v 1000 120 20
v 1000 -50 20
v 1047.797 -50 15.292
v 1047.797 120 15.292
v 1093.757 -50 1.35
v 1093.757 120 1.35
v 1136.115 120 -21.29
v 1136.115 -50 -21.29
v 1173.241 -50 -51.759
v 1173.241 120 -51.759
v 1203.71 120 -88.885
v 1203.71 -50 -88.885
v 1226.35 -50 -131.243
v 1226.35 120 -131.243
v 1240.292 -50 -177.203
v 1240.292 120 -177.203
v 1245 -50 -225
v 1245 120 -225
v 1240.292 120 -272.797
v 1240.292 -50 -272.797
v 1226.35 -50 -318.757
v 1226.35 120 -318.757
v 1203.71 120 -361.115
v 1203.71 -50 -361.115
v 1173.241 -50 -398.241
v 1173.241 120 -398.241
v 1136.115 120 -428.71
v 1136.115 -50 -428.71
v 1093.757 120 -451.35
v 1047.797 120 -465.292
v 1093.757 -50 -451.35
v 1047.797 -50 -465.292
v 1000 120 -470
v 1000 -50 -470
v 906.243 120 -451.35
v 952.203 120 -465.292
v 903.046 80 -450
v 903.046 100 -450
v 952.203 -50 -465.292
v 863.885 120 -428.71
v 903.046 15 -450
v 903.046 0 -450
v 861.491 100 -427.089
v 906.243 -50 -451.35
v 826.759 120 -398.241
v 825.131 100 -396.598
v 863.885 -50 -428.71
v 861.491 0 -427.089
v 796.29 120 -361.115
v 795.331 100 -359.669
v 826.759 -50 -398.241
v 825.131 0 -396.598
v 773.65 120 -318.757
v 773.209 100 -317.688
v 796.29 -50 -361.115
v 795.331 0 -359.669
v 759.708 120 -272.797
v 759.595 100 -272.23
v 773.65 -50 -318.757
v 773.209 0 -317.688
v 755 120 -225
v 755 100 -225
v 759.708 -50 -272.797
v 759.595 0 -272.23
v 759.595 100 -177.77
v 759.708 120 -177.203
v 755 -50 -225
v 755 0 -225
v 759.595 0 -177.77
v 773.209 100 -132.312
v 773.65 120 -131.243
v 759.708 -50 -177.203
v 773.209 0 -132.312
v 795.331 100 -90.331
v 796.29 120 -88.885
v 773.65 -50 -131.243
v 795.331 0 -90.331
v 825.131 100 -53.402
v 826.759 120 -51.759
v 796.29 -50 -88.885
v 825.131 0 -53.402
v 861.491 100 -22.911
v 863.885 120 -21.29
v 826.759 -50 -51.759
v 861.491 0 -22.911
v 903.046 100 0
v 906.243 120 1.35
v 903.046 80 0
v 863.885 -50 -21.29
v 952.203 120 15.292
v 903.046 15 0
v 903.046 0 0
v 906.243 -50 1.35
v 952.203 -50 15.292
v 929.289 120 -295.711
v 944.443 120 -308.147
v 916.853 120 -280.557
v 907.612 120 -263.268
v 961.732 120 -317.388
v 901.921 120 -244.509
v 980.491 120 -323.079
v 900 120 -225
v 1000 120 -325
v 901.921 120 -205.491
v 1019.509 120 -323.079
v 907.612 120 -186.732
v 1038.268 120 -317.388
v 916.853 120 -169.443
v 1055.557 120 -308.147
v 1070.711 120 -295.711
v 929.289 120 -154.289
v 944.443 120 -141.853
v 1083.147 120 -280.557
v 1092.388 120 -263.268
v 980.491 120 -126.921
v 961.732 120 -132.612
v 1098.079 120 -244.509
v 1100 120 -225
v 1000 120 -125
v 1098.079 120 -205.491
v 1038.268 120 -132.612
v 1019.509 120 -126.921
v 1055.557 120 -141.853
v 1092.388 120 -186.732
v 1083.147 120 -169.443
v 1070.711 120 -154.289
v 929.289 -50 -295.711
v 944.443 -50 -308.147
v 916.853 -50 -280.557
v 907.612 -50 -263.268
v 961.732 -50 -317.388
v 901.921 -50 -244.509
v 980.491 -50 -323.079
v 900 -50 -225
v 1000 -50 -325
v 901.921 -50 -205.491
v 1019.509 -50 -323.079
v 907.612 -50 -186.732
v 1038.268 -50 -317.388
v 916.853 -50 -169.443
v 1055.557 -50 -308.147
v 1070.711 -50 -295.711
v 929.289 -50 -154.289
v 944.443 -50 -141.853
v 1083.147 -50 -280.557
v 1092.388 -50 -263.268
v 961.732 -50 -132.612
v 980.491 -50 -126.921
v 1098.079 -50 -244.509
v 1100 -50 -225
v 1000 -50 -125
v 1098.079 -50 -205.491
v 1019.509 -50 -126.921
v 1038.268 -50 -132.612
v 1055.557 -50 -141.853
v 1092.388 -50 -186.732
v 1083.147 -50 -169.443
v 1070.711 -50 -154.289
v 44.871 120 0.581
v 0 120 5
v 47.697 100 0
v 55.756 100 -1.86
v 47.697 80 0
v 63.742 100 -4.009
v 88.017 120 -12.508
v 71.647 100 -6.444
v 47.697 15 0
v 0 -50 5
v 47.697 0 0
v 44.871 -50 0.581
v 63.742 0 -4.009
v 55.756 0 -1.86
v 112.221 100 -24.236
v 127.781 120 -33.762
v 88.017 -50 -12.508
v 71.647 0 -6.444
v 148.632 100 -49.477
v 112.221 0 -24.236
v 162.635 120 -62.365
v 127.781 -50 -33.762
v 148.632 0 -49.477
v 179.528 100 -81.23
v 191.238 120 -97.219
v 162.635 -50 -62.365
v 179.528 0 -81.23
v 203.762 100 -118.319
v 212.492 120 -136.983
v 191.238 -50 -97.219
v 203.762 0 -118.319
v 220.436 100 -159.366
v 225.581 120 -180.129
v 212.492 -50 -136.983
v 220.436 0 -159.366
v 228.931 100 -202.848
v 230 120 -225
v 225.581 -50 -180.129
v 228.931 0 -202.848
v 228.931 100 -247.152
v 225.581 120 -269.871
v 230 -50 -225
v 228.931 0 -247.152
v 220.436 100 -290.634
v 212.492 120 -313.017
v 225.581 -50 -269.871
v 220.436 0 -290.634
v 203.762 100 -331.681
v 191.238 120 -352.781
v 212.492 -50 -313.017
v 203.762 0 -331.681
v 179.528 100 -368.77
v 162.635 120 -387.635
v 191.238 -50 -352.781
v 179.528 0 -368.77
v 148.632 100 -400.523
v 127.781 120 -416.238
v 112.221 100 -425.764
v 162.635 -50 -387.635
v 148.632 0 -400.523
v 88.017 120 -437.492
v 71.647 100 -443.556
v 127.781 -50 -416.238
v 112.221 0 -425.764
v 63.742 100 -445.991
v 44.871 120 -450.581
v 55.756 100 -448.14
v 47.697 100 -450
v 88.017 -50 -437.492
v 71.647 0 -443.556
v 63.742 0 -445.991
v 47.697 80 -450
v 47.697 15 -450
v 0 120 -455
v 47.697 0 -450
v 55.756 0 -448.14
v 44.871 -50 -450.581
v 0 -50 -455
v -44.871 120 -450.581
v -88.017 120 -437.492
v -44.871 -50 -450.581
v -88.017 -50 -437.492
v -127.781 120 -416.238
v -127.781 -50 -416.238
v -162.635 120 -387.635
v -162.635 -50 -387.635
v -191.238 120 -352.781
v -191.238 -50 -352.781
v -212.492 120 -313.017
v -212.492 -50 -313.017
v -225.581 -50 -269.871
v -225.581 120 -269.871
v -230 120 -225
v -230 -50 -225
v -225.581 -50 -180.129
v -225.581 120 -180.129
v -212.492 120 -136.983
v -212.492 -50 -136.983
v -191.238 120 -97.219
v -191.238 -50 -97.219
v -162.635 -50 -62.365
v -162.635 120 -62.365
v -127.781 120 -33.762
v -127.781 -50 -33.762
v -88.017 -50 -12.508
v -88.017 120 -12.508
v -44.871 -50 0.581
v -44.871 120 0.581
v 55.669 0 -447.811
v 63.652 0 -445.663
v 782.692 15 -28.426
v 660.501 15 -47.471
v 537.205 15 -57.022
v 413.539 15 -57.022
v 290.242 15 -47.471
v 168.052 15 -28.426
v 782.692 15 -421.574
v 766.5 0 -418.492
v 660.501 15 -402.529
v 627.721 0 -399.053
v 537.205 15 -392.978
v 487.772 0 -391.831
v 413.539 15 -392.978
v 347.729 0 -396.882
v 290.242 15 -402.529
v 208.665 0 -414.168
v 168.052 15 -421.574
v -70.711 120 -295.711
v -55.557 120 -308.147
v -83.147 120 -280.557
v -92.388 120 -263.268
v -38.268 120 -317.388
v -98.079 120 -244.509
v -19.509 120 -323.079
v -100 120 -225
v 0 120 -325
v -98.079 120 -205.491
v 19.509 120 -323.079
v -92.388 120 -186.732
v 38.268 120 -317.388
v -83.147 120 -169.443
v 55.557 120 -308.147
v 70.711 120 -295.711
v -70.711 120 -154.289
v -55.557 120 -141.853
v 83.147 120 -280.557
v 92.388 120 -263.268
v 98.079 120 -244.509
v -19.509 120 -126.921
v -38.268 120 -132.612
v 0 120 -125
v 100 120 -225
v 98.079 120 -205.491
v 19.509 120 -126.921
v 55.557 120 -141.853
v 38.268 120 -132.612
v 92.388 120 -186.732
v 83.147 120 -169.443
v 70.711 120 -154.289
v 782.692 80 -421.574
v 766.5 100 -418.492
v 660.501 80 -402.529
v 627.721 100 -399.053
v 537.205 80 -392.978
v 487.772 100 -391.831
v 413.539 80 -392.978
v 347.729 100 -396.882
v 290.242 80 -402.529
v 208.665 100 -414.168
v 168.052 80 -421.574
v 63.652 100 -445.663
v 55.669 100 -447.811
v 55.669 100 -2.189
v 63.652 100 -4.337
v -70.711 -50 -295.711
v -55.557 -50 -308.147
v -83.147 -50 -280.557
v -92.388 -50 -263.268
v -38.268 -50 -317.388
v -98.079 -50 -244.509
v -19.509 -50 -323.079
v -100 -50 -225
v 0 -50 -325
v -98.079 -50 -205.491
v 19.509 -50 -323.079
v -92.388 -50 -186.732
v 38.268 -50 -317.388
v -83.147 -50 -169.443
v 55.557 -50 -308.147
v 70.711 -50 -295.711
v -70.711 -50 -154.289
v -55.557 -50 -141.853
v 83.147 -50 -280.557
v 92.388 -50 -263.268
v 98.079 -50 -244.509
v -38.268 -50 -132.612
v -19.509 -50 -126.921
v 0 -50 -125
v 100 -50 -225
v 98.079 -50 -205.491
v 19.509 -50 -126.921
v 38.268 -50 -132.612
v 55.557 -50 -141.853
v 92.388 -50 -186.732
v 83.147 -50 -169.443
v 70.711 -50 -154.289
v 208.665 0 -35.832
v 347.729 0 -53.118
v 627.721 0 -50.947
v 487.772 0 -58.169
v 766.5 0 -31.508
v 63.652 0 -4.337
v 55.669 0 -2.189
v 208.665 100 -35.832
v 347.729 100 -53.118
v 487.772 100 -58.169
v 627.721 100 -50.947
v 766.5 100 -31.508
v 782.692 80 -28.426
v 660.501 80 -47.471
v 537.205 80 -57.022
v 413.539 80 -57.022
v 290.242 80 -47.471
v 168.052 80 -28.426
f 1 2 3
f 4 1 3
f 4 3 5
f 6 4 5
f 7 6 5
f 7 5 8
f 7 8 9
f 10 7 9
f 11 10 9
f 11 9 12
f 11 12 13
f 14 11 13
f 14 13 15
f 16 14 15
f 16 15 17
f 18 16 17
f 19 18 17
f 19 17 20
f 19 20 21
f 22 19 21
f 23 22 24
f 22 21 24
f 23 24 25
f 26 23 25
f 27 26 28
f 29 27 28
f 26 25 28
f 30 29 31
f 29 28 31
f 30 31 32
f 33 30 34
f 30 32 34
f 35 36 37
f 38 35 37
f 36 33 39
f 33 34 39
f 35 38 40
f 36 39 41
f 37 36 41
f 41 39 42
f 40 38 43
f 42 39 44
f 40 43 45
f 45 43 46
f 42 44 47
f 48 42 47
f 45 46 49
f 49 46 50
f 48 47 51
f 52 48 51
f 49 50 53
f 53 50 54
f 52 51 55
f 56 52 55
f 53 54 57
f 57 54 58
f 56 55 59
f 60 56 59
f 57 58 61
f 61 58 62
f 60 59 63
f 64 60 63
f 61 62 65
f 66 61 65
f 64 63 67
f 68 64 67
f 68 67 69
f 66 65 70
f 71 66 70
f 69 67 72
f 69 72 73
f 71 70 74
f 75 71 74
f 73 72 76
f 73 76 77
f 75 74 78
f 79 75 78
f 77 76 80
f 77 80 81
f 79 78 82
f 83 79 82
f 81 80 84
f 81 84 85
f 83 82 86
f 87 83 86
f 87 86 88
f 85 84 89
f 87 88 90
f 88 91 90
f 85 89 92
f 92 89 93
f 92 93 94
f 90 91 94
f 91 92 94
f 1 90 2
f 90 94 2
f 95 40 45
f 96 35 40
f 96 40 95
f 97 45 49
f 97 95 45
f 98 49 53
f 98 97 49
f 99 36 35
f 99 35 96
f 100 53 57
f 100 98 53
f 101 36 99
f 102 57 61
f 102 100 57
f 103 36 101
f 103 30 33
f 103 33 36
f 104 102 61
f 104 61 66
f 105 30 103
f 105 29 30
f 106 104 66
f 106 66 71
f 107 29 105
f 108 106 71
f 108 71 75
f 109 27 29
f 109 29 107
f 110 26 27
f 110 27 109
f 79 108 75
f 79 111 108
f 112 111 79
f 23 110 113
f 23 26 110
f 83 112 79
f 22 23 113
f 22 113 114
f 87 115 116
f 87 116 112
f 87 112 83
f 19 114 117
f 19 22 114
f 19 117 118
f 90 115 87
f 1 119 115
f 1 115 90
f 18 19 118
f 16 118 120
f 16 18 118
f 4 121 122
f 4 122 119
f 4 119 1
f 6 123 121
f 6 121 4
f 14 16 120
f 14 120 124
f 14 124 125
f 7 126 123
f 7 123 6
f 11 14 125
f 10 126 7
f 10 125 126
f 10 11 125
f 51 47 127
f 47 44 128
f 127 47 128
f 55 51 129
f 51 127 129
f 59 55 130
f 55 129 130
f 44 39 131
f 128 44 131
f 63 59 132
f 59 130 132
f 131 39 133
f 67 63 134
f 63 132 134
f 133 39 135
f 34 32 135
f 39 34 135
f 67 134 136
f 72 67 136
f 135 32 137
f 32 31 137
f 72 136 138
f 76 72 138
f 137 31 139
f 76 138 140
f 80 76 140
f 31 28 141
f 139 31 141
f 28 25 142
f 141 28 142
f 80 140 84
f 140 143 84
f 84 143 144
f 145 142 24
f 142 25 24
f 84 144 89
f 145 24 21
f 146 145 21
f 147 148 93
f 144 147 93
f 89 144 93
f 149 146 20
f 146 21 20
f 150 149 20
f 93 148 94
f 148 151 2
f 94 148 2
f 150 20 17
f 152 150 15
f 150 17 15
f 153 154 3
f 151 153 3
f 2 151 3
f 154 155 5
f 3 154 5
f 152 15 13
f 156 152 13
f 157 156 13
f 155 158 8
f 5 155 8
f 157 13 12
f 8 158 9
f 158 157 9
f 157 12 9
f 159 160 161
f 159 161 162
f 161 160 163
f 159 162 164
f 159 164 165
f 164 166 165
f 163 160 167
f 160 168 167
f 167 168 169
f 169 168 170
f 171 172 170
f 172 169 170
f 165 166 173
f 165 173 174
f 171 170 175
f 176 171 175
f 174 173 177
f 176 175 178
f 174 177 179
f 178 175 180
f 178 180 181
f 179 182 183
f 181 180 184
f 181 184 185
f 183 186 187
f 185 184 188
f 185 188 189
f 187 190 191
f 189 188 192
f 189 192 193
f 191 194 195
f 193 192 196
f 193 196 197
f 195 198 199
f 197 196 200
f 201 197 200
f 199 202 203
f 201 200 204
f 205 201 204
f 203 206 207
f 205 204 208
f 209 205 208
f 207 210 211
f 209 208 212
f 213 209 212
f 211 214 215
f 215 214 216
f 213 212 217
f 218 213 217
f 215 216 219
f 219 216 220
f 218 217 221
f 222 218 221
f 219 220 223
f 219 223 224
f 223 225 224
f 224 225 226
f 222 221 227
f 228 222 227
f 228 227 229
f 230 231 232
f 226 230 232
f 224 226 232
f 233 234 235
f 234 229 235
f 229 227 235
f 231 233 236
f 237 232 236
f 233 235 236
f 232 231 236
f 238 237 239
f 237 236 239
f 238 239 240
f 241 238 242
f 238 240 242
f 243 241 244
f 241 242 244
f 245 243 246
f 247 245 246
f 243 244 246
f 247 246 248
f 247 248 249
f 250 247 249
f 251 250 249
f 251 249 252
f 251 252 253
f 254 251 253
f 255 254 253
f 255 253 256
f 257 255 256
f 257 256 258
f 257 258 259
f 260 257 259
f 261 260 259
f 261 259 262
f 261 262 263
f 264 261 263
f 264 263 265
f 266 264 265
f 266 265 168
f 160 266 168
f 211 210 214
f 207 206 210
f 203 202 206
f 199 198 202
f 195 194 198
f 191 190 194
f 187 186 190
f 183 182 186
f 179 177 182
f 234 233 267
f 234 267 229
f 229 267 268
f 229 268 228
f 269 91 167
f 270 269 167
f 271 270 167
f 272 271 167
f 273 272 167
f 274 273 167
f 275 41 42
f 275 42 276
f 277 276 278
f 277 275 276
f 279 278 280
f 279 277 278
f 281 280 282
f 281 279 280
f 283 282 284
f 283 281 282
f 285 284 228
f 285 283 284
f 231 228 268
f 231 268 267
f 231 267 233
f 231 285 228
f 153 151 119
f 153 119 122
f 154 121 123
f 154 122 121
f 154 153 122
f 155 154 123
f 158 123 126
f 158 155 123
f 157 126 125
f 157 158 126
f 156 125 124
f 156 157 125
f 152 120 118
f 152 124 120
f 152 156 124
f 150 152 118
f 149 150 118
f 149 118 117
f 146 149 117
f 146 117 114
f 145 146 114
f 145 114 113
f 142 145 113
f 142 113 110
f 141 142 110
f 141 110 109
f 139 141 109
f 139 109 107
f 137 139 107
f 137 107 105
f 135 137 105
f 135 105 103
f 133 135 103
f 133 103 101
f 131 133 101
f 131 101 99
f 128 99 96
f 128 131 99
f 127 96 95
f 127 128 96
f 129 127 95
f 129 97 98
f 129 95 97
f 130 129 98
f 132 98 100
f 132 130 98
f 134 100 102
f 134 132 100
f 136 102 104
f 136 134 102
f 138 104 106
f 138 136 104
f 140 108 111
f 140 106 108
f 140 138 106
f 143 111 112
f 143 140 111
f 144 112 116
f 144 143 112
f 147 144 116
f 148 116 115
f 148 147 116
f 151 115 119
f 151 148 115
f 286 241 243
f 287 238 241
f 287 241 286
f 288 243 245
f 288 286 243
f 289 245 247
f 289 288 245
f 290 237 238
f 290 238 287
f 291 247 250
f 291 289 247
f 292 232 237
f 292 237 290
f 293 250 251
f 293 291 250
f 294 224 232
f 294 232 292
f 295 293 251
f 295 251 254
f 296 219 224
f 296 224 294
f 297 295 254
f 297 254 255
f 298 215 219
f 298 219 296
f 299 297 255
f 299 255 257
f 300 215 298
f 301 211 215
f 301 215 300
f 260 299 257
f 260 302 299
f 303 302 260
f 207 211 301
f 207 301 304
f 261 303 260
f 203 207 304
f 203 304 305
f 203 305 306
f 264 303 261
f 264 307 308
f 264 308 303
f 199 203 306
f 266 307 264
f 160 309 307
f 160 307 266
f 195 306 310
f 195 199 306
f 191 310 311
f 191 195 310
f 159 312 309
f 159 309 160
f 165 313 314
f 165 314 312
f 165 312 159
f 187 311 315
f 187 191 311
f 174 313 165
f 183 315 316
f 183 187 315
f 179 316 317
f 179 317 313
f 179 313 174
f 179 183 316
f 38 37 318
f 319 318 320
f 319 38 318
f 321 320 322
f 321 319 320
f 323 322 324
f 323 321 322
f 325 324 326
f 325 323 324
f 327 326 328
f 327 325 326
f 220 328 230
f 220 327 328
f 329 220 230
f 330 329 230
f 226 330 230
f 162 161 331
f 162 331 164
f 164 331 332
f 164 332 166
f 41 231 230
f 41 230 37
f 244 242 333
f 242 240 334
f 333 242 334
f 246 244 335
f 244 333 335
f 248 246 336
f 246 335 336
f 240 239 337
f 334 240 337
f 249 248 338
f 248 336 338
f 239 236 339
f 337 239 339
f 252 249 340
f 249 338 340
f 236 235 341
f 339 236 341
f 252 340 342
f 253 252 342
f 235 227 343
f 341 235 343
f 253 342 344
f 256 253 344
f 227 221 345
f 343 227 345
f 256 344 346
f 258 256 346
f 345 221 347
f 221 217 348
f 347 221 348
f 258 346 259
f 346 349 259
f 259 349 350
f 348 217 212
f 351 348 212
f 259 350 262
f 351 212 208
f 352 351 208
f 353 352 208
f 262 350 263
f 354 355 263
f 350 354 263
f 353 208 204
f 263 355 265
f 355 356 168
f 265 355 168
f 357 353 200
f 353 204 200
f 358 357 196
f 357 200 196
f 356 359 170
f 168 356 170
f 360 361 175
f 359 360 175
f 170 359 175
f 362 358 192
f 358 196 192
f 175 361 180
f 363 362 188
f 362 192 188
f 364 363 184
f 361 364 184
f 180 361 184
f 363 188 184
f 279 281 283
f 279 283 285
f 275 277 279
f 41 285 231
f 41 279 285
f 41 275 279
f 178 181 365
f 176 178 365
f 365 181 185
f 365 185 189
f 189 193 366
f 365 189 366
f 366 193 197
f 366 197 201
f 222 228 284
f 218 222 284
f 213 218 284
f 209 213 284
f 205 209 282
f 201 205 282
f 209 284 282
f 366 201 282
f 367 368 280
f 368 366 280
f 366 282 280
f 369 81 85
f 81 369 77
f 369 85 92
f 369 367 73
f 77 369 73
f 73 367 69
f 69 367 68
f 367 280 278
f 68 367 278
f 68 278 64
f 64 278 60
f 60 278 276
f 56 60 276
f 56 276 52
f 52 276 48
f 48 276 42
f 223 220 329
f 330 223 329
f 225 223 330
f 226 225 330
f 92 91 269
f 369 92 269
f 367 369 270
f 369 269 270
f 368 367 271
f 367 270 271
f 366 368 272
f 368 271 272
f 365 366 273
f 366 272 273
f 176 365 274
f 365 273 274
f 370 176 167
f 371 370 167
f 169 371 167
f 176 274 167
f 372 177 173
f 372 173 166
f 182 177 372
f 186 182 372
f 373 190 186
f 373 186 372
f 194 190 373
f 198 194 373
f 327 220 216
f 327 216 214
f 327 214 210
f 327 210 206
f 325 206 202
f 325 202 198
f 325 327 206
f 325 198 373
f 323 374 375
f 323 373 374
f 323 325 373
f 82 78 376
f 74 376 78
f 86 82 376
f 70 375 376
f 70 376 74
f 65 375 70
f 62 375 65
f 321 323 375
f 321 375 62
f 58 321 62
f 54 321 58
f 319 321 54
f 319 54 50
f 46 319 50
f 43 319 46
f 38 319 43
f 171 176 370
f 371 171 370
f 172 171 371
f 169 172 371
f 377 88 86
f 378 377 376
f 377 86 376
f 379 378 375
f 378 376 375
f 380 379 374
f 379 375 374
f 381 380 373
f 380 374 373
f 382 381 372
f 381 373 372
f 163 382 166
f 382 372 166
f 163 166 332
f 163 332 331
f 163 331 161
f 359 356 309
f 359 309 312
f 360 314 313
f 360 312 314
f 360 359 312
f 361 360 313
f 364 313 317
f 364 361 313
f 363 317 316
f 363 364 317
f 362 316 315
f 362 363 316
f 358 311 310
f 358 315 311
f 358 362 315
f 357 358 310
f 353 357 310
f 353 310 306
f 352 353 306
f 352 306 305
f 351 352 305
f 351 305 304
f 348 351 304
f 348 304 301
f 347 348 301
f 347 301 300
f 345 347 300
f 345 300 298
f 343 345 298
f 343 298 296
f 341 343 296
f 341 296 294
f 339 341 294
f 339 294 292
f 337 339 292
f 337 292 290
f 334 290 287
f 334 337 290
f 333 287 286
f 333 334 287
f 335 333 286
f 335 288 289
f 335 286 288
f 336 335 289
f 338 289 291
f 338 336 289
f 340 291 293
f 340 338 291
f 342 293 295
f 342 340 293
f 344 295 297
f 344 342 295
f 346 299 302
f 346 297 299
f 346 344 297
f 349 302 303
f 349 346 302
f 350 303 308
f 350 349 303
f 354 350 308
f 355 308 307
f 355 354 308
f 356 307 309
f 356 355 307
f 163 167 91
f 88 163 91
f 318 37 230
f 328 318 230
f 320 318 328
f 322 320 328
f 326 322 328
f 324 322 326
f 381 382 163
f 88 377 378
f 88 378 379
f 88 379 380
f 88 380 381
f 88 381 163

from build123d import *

# Parameters (mm, degrees)
CROQUIS3_W                   = 1000
CROQUIS3_H                   = 450
SALIENTE_EXTRUIR4_DEPTH      = 100
SALIENTE_EXTRUIR5_DEPTH      = 20
SALIENTE_EXTRUIR5_DEPTH_BACK = 150
CROQUIS6_R                   = 245
CROQUIS6_R_2                 = 230
CORTAR_EXTRUIR5_DEPTH        = 20
CORTAR_EXTRUIR4_DEPTH        = 1342.575566265
CORTAR_EXTRUIR4_DEPTH_BACK   = 1342.575566265
CROQUIS8_R                   = 100
CORTAR_EXTRUIR6_START        = -15
CORTAR_EXTRUIR6_DEPTH        = 15


with BuildPart() as part:
    # Croquis3 → Saliente-Extruir4 (new body)
    with BuildSketch(Plane(origin=(0, 0, 0), x_dir=(1, 0, 0), z_dir=(0, 1, 0))):
        with Locations((500, 225)):
            Rectangle(CROQUIS3_W, CROQUIS3_H)
    extrude(amount=SALIENTE_EXTRUIR4_DEPTH)

    # Croquis6 → Saliente-Extruir5 (add, two sides: drawn at the far end of the back side and taken through both)
    with BuildSketch(Plane(origin=(0, 100, 0), x_dir=(1, 0, 0), z_dir=(0, 1, 0)).offset(-SALIENTE_EXTRUIR5_DEPTH_BACK)):
        with Locations(Location((1000, 225, 0), (0, 0, 270))):
            Circle(CROQUIS6_R)
        with Locations(Location((0, 225, 0), (0, 0, 270))):
            Circle(CROQUIS6_R_2)
    extrude(amount=SALIENTE_EXTRUIR5_DEPTH + SALIENTE_EXTRUIR5_DEPTH_BACK)

    # Croquis7 → Cortar-Extruir5 (cut)
    with BuildSketch(Plane(origin=(0, 100, 0), x_dir=(1, 0, 0), z_dir=(0, 1, 0))):
        with BuildLine():
            Line((47.696960071, 0), (903.046402852, 0))
            ThreePointArc((903.046402852, 0), (475.371681461, 58.217157741), (47.696960071, 0))
        make_face()
        with BuildLine():
            Line((47.696960071, 450), (903.046402852, 450))
            ThreePointArc((903.046402852, 450), (475.371681461, 391.782842259), (47.696960071, 450))
        make_face()
    extrude(amount=-CORTAR_EXTRUIR5_DEPTH, mode=Mode.SUBTRACT)

    # Croquis8 → Cortar-Extruir4 (cut, two sides: drawn at the far end of the back side and taken through both)
    with BuildSketch(Plane(origin=(0, 120, 0), x_dir=(1, 0, 0), z_dir=(0, 1, 0)).offset(-CORTAR_EXTRUIR4_DEPTH_BACK)):
        with Locations(Location((0, 225, 0), (0, 0, 270))):
            Circle(CROQUIS8_R)
        with Locations(Location((1000, 225, 0), (0, 0, 270))):
            Circle(CROQUIS8_R)
    extrude(amount=CORTAR_EXTRUIR4_DEPTH + CORTAR_EXTRUIR4_DEPTH_BACK, mode=Mode.SUBTRACT)

    # Croquis9 → Cortar-Extruir6 (cut)
    with BuildSketch(Plane.XZ.offset(CORTAR_EXTRUIR6_START)):
        with BuildLine():
            Line((47.696960071, 0), (903.046402852, 0))
            ThreePointArc((903.046402852, 0), (475.371681461, -58.217157741), (47.696960071, 0))
        make_face()
        with BuildLine():
            Line((47.696960071, -450), (903.046402852, -450))
            ThreePointArc((903.046402852, -450), (475.371681461, -391.782842259), (47.696960071, -450))
        make_face()
    extrude(amount=CORTAR_EXTRUIR6_DEPTH, mode=Mode.SUBTRACT)


solid = part.part
